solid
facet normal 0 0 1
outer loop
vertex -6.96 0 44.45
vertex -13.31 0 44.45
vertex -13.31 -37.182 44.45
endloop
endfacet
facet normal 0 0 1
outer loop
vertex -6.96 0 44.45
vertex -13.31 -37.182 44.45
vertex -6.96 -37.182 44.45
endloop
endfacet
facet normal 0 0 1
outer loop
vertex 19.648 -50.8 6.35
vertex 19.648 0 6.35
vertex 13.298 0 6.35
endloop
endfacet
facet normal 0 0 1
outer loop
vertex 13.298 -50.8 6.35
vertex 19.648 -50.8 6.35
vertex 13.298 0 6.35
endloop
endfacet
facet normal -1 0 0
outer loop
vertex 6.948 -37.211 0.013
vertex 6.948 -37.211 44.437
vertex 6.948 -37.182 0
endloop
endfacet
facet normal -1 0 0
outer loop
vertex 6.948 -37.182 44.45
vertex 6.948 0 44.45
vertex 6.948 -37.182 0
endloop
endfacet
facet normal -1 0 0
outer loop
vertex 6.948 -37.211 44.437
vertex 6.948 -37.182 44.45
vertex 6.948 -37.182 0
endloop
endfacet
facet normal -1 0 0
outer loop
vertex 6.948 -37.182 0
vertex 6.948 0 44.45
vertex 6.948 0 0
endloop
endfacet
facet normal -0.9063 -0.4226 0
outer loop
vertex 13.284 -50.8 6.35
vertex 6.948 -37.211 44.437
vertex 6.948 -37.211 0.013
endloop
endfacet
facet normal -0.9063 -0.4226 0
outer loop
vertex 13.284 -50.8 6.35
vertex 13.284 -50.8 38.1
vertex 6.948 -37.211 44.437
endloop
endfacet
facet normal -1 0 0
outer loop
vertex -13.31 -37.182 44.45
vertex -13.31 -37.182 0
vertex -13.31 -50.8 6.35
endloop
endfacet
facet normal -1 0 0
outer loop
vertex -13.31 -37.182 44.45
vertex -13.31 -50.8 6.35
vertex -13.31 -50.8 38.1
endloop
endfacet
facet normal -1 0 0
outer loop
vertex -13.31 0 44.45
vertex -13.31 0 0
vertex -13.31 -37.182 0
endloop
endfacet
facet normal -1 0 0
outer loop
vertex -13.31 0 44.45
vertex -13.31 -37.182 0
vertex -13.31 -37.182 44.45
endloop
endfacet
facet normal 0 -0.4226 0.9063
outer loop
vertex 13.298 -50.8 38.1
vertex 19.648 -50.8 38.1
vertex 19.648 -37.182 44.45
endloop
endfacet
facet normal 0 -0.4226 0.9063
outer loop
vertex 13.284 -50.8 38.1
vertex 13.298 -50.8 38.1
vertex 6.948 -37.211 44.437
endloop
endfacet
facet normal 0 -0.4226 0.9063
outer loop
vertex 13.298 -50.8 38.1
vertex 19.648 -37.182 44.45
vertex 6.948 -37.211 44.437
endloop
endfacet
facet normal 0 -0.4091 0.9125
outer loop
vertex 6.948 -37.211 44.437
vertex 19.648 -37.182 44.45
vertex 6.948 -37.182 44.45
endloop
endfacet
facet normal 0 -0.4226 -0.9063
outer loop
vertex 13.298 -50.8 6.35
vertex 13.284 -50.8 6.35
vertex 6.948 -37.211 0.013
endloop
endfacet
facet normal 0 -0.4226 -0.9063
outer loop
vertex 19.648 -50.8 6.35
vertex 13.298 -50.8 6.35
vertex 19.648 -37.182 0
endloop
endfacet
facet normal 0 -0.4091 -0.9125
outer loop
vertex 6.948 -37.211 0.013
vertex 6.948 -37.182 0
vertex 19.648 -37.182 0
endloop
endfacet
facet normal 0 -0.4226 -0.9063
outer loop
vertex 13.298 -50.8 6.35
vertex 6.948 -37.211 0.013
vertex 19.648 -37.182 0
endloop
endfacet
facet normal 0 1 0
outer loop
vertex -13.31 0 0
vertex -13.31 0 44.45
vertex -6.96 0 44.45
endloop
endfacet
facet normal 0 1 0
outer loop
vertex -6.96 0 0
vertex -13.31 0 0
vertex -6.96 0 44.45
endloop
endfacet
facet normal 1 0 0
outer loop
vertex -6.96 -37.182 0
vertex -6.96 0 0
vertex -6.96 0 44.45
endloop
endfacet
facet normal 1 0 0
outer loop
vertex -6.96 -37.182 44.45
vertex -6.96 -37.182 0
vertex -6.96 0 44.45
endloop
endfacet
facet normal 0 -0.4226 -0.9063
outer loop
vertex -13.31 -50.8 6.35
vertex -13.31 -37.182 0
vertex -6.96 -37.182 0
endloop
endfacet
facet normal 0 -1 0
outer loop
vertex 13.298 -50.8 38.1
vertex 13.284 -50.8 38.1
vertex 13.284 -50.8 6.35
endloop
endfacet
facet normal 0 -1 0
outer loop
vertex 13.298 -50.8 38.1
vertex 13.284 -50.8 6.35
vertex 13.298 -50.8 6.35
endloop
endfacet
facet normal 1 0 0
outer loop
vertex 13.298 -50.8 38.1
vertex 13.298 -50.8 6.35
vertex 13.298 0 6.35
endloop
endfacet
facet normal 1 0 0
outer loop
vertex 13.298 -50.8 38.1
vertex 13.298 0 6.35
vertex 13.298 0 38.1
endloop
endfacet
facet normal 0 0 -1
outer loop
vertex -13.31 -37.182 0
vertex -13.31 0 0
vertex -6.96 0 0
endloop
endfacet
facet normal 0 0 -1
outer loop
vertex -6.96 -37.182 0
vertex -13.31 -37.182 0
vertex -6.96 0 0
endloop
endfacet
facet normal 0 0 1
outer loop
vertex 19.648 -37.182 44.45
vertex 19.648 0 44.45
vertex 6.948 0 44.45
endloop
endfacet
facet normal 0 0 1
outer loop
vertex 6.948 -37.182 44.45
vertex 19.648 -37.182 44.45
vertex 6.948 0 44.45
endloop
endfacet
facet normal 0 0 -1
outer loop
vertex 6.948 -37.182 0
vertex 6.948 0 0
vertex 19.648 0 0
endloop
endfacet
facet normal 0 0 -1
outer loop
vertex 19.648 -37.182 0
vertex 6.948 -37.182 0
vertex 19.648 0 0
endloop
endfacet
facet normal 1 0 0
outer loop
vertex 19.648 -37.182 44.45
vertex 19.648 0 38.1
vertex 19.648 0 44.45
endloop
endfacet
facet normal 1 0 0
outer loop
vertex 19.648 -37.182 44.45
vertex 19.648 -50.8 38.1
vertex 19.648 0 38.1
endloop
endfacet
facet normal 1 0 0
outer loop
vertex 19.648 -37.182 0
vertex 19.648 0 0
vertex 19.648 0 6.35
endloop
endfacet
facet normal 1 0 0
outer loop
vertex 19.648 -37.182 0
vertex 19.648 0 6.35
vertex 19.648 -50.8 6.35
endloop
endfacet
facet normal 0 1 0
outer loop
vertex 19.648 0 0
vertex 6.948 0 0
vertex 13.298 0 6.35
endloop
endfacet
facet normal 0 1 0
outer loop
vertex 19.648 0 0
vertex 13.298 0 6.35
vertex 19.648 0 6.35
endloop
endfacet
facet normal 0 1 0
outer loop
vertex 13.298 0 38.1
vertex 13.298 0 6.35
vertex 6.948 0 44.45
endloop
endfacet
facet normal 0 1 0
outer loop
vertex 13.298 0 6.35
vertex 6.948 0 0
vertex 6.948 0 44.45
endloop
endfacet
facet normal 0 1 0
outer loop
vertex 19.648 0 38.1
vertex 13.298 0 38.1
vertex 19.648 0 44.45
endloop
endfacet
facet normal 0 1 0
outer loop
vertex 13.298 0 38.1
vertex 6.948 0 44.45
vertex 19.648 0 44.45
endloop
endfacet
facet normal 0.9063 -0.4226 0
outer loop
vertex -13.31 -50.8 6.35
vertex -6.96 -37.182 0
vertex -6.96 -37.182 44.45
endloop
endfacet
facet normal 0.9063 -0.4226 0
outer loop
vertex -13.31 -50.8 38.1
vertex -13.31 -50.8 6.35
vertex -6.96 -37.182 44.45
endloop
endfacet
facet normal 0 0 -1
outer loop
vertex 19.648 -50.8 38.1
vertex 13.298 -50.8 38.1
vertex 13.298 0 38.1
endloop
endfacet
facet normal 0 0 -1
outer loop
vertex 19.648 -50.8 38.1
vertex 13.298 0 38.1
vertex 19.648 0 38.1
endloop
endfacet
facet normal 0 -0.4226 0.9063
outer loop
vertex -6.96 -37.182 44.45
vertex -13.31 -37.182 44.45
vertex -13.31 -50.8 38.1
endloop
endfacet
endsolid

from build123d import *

# Parameters (mm, degrees)
F1_DEPTH = 50.8
F2_W     = 6.35
F2_H     = 44.45
F3_DEPTH = 50.8
F4_SIZE2 = 6.3366547667
F4_SIZE  = 13.589
F5_SIZE2 = 13.6176189452
F5_SIZE  = 6.35
F6_SIZE2 = 13.6176189452
F6_SIZE  = 6.35
F7_SIZE2 = 13.617609
F7_SIZE  = 6.34999


# Not quite as in the source:
# - a fillet or chamfer is up to 0.001 mm smaller than in the source, because OpenCascade refuses the exact size


with BuildPart() as f1:
    # F0 (on Front) → F1 (new body)
    with BuildSketch(Plane.XZ):
        Polygon((19.6477800332, 38.1), (19.6477800332, 44.45), (6.9477800332, 44.45), (6.9477800332, 0), (19.6477800332, 0), (19.6477800332, 6.35), (13.2977800332, 6.35), (13.2977800332, 38.1), align=None)
    extrude(amount=F1_DEPTH)

    # F4
    f4_edges = [f1.edges().sort_by_distance(p)[0] for p in [
        (6.94778, -50.8, 22.225),
    ]]
    f4_side = f1.faces().sort_by_distance((6.94778, -25.4, 22.225))[0]
    chamfer(f4_edges, length=F4_SIZE, length2=F4_SIZE2, reference=f4_side)

    # F5
    f5_edges = [f1.edges().sort_by_distance(p)[0] for p in [
        (16.466107, -50.8, 0),
    ]]
    f5_side = f1.faces().sort_by_distance((16.466107, -50.8, 44.000968))[0]
    chamfer(f5_edges, length=F5_SIZE, length2=F5_SIZE2, reference=f5_side)

    # F6
    f6_edges = [f1.edges().sort_by_distance(p)[0] for p in [
        (16.466107, -50.8, 44.45),
    ]]
    f6_side = f1.faces().sort_by_distance((16.43316, -50.8, 41.077314))[0]
    chamfer(f6_edges, length=F6_SIZE, length2=F6_SIZE2, reference=f6_side)


with BuildPart() as f3:
    # F2 (on Front) → F3 (new body)
    with BuildSketch(Plane.XZ):
        with Locations((-10.1346, 22.225)):
            Rectangle(F2_W, F2_H)
    extrude(amount=F3_DEPTH)

    # F7 (size 6.35 and 13.6176189452 in the source; OpenCascade refuses exactly that, so slightly less here)
    f7_edges = [f3.edges().sort_by_distance(p)[0] for p in [
        (-6.9596, -50.8, 22.225),
        (-10.1346, -50.8, 44.45),
        (-10.1346, -50.8, 0),
    ]]
    f7_side = f3.faces().sort_by_distance((-10.1346, -50.8, 22.225))[0]
    chamfer(f7_edges, length=F7_SIZE, length2=F7_SIZE2, reference=f7_side)


solid = Compound([f1.part, f3.part])
